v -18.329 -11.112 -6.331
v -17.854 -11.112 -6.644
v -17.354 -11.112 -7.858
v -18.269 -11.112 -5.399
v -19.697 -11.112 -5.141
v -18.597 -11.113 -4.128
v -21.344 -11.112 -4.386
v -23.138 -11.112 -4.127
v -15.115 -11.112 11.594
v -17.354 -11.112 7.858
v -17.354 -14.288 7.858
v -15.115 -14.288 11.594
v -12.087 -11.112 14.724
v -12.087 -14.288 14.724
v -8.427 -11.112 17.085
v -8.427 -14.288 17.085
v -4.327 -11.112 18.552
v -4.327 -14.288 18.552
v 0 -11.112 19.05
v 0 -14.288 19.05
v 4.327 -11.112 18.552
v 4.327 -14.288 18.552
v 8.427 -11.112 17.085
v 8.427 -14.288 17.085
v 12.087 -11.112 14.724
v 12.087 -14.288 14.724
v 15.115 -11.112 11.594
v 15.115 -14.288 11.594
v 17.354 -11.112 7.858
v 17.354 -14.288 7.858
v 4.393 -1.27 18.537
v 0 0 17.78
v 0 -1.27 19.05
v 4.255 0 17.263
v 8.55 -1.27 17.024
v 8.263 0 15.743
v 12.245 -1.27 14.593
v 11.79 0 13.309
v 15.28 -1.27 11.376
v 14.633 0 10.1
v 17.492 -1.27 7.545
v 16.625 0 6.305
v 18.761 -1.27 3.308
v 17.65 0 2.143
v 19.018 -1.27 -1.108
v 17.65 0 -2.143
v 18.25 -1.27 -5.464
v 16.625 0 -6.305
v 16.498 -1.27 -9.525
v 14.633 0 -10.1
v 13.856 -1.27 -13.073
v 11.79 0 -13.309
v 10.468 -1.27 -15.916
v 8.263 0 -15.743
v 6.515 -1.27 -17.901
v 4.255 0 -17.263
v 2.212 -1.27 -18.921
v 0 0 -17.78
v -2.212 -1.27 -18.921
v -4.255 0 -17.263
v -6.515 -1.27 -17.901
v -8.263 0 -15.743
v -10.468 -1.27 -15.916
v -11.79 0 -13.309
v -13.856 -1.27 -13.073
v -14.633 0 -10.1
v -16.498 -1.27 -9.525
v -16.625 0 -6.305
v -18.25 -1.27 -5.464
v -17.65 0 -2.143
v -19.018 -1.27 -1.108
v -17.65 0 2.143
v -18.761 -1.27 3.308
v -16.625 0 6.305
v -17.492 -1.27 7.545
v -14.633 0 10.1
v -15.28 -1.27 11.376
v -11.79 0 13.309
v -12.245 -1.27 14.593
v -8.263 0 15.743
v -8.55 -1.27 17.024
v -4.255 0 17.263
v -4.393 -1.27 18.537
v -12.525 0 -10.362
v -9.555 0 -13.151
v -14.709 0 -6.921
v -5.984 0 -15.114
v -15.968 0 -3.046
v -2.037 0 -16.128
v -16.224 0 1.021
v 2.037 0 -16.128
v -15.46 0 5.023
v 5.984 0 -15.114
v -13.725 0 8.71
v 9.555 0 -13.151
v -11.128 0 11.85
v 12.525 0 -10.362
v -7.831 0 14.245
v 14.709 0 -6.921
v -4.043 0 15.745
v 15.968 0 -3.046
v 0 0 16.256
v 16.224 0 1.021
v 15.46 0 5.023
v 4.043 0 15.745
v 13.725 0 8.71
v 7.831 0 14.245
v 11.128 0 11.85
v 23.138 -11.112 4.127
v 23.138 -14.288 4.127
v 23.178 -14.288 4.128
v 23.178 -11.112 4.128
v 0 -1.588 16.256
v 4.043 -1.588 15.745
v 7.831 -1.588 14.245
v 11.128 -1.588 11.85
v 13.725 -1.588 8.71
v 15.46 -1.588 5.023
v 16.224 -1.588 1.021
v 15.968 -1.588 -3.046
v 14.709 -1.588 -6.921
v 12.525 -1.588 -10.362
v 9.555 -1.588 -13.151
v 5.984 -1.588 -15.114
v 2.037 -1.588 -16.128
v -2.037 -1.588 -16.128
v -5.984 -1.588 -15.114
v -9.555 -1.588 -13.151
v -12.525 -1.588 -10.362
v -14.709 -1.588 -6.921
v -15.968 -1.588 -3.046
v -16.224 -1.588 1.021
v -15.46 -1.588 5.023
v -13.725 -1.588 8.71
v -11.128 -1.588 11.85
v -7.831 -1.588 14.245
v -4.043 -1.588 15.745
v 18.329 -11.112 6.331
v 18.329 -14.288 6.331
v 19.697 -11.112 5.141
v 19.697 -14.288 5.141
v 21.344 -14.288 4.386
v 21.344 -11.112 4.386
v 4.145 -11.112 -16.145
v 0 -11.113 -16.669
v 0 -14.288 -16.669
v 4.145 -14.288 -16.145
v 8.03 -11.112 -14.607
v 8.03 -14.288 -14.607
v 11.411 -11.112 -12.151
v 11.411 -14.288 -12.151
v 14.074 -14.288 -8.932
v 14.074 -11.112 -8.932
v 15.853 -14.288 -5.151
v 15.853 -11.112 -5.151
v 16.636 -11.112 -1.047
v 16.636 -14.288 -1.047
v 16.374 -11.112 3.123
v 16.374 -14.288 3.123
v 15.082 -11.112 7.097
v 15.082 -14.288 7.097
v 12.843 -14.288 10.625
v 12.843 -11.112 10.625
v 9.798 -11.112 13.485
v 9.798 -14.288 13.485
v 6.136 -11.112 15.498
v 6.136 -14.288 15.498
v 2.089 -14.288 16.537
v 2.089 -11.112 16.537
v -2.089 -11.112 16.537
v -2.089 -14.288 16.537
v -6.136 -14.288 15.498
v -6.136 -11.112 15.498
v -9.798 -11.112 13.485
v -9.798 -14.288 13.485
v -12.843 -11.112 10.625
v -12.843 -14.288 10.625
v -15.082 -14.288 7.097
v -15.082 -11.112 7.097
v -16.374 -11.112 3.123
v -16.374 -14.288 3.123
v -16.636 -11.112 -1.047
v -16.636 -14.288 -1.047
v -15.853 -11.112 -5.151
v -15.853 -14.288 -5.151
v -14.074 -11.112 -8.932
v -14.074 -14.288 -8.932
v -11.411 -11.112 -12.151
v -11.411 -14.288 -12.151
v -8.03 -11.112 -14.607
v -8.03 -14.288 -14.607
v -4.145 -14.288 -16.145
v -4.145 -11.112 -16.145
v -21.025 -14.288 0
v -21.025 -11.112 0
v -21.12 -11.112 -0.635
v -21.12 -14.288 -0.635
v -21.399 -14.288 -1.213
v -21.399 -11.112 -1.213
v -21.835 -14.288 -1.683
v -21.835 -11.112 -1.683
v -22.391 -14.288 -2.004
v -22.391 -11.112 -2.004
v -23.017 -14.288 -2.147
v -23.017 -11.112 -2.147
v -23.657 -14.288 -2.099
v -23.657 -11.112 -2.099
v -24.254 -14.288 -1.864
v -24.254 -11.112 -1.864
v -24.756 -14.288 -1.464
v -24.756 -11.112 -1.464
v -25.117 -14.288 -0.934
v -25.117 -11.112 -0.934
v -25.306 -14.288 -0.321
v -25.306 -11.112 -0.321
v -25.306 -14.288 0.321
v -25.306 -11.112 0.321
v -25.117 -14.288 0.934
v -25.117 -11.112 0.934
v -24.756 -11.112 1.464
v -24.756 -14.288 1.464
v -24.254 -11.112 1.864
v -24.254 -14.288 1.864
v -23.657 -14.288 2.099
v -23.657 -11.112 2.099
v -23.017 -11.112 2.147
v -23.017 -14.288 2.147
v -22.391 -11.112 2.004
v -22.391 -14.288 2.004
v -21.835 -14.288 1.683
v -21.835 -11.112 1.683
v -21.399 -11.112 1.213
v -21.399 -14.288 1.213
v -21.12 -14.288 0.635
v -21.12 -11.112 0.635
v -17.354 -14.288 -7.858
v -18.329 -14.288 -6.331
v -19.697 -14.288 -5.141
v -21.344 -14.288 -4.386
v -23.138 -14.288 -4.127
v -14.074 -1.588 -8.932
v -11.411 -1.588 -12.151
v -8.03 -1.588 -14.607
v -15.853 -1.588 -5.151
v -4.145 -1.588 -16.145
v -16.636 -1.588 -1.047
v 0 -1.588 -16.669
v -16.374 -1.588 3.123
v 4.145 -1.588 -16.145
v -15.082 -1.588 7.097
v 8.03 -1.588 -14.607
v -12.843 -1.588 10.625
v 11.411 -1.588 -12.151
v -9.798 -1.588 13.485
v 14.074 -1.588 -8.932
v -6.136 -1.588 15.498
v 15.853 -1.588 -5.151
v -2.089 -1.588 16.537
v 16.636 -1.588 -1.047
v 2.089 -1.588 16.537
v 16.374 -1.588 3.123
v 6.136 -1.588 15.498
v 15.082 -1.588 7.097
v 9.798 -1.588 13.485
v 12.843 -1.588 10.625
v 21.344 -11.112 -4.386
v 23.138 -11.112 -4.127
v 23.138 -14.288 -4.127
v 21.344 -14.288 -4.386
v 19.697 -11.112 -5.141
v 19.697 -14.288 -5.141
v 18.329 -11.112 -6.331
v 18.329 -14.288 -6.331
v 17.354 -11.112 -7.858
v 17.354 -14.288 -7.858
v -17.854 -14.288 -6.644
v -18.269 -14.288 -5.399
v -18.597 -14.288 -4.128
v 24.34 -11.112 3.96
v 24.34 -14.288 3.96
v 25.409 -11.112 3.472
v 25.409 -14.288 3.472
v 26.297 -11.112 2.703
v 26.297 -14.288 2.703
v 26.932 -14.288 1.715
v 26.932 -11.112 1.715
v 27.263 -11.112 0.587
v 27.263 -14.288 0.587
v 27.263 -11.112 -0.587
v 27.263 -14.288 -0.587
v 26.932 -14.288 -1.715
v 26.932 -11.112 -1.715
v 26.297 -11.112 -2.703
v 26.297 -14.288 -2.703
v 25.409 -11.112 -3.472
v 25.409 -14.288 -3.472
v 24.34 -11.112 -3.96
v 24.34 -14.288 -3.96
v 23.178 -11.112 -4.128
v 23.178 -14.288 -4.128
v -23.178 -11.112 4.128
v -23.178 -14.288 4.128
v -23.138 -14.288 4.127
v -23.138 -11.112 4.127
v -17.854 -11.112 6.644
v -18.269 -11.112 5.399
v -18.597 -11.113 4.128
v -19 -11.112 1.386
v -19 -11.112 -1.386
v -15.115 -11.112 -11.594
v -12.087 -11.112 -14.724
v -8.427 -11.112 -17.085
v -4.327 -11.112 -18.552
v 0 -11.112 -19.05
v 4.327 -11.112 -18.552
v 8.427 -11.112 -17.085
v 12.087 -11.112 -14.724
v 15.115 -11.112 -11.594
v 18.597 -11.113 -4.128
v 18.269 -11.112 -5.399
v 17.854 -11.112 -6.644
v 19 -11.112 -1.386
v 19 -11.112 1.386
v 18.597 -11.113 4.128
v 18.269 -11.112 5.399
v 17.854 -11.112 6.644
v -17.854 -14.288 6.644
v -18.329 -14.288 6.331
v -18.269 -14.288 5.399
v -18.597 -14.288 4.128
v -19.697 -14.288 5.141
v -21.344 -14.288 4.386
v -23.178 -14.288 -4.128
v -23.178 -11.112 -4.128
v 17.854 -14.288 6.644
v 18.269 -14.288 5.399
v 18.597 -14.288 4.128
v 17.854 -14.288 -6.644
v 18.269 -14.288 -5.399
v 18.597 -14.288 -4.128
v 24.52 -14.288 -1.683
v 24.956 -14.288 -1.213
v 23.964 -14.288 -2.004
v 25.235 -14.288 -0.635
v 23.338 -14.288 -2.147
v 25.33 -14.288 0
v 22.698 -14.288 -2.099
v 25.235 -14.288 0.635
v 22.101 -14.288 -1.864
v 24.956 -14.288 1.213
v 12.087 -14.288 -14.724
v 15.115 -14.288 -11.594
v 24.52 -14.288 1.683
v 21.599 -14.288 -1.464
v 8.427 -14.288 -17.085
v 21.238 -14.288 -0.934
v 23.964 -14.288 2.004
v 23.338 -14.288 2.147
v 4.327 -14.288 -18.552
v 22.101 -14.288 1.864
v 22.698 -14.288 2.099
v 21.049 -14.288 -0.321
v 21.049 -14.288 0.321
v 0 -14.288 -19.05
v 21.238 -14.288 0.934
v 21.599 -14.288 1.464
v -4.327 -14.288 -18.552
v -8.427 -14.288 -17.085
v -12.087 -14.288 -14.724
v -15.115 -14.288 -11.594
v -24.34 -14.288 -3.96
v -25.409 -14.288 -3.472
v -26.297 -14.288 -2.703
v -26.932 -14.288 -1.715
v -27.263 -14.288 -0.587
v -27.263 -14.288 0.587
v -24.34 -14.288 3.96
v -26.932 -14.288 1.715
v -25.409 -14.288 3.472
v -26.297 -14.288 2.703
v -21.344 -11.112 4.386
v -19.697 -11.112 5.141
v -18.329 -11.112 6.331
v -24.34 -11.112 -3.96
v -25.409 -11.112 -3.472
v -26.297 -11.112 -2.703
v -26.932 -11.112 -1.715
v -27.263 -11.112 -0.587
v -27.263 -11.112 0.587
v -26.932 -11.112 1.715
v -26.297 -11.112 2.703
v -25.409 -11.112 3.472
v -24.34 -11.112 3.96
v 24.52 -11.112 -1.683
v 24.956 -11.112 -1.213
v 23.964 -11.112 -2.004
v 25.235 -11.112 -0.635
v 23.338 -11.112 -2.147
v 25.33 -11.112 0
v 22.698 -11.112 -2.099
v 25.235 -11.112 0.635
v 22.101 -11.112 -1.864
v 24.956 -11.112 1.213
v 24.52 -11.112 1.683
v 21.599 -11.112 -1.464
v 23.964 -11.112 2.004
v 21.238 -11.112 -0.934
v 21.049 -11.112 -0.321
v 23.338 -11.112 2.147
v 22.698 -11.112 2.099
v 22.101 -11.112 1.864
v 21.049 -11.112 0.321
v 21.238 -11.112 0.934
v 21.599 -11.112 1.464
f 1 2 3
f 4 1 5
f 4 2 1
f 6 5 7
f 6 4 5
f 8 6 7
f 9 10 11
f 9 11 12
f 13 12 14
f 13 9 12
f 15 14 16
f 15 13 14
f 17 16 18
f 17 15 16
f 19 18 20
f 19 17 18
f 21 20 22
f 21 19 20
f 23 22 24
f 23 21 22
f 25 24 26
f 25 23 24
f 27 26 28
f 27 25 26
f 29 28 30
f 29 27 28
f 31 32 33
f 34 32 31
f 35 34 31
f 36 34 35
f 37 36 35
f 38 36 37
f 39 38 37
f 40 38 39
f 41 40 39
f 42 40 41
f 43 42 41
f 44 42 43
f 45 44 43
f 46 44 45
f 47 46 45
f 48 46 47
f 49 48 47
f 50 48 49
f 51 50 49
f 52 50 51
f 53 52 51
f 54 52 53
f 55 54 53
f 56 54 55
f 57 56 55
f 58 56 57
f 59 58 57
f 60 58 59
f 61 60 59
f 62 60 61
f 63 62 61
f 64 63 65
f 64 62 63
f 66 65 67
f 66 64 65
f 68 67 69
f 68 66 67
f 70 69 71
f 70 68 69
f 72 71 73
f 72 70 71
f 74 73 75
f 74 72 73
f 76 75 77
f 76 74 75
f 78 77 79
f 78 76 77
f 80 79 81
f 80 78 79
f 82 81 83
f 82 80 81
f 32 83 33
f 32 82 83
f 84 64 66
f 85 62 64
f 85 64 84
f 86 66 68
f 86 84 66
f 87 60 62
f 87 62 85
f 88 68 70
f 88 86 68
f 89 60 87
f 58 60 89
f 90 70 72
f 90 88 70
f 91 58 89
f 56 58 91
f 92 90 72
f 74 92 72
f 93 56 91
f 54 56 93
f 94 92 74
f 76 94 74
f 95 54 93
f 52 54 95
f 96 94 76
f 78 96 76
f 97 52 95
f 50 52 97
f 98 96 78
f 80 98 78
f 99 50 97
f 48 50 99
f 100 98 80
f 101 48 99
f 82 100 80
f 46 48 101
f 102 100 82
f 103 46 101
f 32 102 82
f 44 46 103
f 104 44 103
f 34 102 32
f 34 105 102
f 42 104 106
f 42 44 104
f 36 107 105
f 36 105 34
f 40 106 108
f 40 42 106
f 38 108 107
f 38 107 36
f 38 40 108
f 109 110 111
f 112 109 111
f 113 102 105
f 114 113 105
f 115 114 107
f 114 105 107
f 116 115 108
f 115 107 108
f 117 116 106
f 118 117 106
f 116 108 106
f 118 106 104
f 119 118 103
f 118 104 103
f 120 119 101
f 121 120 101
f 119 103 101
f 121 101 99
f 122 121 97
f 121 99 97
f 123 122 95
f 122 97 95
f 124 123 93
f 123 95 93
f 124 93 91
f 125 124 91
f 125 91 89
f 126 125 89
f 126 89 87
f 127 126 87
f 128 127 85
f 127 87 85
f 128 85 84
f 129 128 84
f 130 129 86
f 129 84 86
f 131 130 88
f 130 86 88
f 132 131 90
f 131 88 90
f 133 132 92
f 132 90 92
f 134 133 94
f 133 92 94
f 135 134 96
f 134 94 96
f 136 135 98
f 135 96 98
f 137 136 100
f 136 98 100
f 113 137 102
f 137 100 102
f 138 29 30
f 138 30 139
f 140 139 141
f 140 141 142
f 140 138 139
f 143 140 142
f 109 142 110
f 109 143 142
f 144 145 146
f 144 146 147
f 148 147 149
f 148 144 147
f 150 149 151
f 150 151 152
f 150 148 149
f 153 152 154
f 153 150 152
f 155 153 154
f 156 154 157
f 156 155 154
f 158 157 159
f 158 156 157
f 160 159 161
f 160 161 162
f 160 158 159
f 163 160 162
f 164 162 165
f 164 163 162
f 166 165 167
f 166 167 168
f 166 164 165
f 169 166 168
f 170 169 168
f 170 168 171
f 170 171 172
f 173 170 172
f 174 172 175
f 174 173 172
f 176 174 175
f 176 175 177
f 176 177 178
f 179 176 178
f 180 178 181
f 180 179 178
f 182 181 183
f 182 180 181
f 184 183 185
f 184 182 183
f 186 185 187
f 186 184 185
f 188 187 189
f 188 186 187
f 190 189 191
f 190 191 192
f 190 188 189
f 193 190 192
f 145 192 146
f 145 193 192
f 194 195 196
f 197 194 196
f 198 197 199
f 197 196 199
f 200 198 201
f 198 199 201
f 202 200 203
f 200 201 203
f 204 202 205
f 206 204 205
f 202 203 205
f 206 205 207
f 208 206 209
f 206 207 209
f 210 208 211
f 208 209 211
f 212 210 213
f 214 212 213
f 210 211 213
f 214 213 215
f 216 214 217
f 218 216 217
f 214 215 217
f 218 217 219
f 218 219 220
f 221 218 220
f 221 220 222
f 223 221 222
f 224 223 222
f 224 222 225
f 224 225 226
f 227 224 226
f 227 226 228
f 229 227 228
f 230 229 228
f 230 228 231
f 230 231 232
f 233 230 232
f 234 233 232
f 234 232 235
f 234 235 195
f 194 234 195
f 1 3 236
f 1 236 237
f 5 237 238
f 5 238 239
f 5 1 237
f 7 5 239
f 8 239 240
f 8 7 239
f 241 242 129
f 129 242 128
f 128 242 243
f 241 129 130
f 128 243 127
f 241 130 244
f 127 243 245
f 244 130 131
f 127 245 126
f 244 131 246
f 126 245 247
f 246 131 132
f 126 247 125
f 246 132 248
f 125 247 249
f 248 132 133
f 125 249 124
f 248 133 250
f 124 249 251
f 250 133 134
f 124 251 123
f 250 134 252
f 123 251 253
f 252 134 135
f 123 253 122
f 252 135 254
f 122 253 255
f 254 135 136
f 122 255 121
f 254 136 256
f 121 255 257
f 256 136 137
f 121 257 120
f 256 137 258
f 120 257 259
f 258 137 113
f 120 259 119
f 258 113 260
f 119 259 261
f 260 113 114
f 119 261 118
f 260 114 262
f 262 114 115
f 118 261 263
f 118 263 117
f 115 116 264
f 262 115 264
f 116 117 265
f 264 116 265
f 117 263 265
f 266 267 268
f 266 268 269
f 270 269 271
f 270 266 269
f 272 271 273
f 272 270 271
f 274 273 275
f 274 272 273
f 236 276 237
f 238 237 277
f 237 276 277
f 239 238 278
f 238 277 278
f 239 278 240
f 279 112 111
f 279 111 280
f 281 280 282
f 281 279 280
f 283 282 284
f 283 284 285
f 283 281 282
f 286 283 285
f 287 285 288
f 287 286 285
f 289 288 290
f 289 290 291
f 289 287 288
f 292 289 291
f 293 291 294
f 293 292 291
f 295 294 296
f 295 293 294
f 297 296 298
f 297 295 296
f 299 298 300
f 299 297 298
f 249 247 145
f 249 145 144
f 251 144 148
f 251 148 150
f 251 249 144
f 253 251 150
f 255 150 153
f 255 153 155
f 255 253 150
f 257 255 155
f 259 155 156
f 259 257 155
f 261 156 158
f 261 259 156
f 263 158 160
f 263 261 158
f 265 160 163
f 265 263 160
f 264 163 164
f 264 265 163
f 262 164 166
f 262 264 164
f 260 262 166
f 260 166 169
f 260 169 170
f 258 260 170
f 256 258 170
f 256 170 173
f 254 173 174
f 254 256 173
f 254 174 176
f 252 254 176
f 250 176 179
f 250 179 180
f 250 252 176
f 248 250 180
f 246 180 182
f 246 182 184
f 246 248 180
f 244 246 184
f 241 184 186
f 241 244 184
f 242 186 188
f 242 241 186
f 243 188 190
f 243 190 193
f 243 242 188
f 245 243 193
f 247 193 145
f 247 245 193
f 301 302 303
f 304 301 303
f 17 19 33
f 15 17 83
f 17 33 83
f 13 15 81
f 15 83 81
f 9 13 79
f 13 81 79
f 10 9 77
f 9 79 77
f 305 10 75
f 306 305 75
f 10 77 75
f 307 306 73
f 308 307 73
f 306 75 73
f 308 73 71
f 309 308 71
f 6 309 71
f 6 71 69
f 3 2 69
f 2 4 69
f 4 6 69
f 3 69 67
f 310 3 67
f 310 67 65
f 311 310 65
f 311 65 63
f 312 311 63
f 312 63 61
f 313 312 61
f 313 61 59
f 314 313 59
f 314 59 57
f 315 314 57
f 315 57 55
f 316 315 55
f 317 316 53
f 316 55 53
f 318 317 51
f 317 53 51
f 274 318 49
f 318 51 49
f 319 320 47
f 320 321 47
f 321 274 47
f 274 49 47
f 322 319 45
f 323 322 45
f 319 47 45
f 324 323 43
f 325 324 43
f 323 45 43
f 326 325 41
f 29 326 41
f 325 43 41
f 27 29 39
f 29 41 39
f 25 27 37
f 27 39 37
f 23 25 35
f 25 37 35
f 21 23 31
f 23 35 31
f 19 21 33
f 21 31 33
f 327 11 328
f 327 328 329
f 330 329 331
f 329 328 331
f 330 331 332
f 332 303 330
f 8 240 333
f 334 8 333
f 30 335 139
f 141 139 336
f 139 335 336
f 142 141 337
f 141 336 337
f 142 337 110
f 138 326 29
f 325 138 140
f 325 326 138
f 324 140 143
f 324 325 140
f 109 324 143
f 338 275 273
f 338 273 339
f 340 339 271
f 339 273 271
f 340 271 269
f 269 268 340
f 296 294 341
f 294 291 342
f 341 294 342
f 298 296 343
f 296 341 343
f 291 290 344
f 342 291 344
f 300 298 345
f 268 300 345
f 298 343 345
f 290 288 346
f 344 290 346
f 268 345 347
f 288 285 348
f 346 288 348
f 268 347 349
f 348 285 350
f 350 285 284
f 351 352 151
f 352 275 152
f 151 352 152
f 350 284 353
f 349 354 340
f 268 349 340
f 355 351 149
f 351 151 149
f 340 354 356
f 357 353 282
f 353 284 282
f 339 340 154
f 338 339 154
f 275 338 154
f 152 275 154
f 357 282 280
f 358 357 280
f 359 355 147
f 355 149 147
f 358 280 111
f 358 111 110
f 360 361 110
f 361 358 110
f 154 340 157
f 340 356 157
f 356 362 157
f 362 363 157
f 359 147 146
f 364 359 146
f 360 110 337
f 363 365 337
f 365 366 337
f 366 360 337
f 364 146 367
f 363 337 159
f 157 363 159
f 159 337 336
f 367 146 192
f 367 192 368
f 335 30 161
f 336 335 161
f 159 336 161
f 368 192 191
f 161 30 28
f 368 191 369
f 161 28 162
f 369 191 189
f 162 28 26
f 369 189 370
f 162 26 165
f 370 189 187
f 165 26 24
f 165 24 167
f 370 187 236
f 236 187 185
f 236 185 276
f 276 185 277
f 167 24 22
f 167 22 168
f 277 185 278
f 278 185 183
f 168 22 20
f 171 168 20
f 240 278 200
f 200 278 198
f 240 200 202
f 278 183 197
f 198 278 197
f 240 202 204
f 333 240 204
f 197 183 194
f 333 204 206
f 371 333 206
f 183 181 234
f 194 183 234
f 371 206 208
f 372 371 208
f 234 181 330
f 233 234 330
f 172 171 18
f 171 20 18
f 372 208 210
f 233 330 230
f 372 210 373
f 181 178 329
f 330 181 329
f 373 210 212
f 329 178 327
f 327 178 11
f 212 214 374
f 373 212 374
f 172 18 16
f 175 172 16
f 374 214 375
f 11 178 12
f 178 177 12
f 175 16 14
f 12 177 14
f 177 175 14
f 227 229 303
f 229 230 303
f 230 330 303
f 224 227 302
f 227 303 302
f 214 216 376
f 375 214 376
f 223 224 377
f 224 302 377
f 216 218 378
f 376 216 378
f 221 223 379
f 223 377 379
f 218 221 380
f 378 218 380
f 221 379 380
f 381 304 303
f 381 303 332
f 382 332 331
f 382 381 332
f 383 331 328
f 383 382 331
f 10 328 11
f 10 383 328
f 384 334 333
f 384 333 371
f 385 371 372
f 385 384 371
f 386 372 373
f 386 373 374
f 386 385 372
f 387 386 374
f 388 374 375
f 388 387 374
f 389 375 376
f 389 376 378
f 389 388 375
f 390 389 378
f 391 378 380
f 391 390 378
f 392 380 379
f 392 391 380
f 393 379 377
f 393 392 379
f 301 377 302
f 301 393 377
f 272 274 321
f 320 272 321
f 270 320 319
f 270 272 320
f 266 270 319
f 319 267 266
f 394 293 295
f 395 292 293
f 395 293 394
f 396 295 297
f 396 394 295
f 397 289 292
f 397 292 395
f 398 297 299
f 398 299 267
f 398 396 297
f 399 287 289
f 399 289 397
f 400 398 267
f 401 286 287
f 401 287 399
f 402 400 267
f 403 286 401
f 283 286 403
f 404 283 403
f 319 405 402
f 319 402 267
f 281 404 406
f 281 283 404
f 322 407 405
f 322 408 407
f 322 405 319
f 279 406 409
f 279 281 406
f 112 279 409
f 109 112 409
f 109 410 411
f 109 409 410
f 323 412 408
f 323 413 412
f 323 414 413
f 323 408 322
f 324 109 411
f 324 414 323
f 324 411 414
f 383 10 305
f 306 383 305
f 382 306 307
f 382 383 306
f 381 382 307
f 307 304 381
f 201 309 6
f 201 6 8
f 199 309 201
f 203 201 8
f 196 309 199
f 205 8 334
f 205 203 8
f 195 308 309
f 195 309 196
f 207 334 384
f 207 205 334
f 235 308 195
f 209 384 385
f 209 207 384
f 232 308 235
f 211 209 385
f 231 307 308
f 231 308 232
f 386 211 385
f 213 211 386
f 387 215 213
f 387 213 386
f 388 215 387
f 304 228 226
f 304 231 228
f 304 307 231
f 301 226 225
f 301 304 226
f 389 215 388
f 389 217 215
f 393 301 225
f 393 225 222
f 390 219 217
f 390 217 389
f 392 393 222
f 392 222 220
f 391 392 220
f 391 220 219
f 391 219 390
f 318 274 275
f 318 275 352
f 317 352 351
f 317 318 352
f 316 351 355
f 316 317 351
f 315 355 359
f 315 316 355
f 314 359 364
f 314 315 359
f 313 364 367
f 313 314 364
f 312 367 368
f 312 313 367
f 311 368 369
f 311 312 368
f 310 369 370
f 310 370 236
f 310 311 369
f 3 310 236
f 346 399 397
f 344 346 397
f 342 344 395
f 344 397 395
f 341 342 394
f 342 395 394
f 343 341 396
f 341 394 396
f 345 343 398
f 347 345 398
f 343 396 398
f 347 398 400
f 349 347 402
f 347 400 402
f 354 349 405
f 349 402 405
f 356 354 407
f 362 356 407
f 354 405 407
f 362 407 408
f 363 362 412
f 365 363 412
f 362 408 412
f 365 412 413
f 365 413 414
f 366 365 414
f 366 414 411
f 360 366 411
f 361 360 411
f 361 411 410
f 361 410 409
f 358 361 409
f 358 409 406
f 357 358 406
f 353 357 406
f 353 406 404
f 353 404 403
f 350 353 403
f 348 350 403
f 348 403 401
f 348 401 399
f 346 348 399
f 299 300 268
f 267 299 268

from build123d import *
from build123d.topology import SkipClean

# Parameters (mm, degrees)
SKETCH1_R             = 19.05
SKETCH1_R_2           = 16.256
BOSS_EXTRUDE1_DEPTH   = 1.5875
SKETCH2_R             = 19.05
SKETCH2_R_2           = 16.66875
BOSS_EXTRUDE2_DEPTH   = 9.525
CHAMFER1_SIZE         = 1.27
SKETCH3_R             = 16.66875
BOSS_EXTRUDE3_DEPTH   = 3.175
FILLET1_R             = 6.35
F_6_CLEARANCE_HOLE1_D = 4.3053


with BuildPart() as part:
    # Sketch1 → Boss-Extrude1 (new body)
    with BuildSketch(Plane(origin=(0, 0, 0), x_dir=(1, 0, 0), z_dir=(0, 1, 0))):
        with Locations(Location((0, 0, 0), (0, 0, 270))):
            Circle(SKETCH1_R)
        with Locations(Location((0, 0, 0), (0, 0, 270))):
            Circle(SKETCH1_R_2, mode=Mode.SUBTRACT)
    extrude(amount=-BOSS_EXTRUDE1_DEPTH)

    # Sketch2 → Boss-Extrude2 (add)
    with BuildSketch(Plane.XZ.offset(1.5875)):
        with Locations(Location((0, 0, 0), (0, 0, 90))):
            Circle(SKETCH2_R)
        with Locations(Location((0, 0, 0), (0, 0, 270))):
            Circle(SKETCH2_R_2, mode=Mode.SUBTRACT)
    extrude(amount=BOSS_EXTRUDE2_DEPTH)

    # Chamfer1
    chamfer1_edges = [part.edges().sort_by_distance(p)[0] for p in [
        (0, 0, -19.05),
    ]]
    chamfer(chamfer1_edges, length=CHAMFER1_SIZE)

    # Sketch3 → Boss-Extrude3 (add)
    with SkipClean():  # the faces are left unmerged after this step: merging them gives an invalid solid
        with BuildSketch(Plane.XZ.offset(11.1125)):
            with BuildLine():
                Line((-23.1775, 4.1275), (-18.5974795, 4.1275))
                ThreePointArc((-18.5974795, 4.1275), (0, 19.05), (18.5974795, 4.1275))
                Line((18.5974795, 4.1275), (23.1775, 4.1275))
                ThreePointArc((23.1775, 4.1275), (27.305, 0), (23.1775, -4.1275))
                Line((23.1775, -4.1275), (18.5974795, -4.1275))
                ThreePointArc((18.5974795, -4.1275), (0, -19.05), (-18.5974795, -4.1275))
                Line((-18.5974795, -4.1275), (-23.1775, -4.1275))
                ThreePointArc((-23.1775, -4.1275), (-27.305, 0), (-23.1775, 4.1275))
            make_face()
            with Locations(Location((0, 0, 0), (0, 0, 270))):
                Circle(SKETCH3_R, mode=Mode.SUBTRACT)
        extrude(amount=BOSS_EXTRUDE3_DEPTH)
    add(part.part.scale(1), mode=Mode.REPLACE)  # the faces are merged on a copy

    # Fillet1
    # the kernel refuses this fillet: 6.35 mm, written as the material it adds along each edge
    with BuildSketch(Plane(origin=(18.5974795, -11.1125, 4.1275), x_dir=(-0.3162725181456123, 0, 0.948668379501411), z_dir=(0, -1, 0)), Plane(origin=(-18.5974795, -11.1125, -4.1275), x_dir=(0.3162725181456131, 0, -0.9486683795014108), z_dir=(0, -1, 0))) as fillet1_piece_1:
        with BuildLine():
            CenterArc((4.587900184, -6.316085186), FILLET1_R, 95.924326289, 65.63802206)
            Line((-1.436144025, -4.307754696), (0, 0))
            ThreePointArc((0, 0), (1.966242936, -0.101744441), (3.932485872, 0))
        make_face()
    extrude(amount=3.175)
    with BuildSketch(Plane(origin=(-18.5974795, -11.1125, 4.1275), x_dir=(0.3162725181456136, 0, 0.9486683795014107), z_dir=(0, -1, 0)), Plane(origin=(18.5974795, -11.1125, -4.1275), x_dir=(-0.3162725181456148, 0, -0.9486683795014103), z_dir=(0, -1, 0))) as fillet1_piece_2:
        with BuildLine():
            CenterArc((4.587900184, 6.316085186), FILLET1_R, 198.437651651, 65.63802206)
            Line((-1.436144025, 4.307754696), (0, 0))
            ThreePointArc((0, 0), (1.966242936, 0.101744441), (3.932485872, 0))
        make_face()
    extrude(amount=3.175)

    # #6 Clearance Hole1 (through all)
    with Locations(Plane(origin=(0, -14.2875, 0), x_dir=(-1, 0, 0), z_dir=(0, -1, 0))):
        with Locations((-23.1775, 0), (23.1775, 0)):
            Hole(F_6_CLEARANCE_HOLE1_D / 2)


solid = part.part
